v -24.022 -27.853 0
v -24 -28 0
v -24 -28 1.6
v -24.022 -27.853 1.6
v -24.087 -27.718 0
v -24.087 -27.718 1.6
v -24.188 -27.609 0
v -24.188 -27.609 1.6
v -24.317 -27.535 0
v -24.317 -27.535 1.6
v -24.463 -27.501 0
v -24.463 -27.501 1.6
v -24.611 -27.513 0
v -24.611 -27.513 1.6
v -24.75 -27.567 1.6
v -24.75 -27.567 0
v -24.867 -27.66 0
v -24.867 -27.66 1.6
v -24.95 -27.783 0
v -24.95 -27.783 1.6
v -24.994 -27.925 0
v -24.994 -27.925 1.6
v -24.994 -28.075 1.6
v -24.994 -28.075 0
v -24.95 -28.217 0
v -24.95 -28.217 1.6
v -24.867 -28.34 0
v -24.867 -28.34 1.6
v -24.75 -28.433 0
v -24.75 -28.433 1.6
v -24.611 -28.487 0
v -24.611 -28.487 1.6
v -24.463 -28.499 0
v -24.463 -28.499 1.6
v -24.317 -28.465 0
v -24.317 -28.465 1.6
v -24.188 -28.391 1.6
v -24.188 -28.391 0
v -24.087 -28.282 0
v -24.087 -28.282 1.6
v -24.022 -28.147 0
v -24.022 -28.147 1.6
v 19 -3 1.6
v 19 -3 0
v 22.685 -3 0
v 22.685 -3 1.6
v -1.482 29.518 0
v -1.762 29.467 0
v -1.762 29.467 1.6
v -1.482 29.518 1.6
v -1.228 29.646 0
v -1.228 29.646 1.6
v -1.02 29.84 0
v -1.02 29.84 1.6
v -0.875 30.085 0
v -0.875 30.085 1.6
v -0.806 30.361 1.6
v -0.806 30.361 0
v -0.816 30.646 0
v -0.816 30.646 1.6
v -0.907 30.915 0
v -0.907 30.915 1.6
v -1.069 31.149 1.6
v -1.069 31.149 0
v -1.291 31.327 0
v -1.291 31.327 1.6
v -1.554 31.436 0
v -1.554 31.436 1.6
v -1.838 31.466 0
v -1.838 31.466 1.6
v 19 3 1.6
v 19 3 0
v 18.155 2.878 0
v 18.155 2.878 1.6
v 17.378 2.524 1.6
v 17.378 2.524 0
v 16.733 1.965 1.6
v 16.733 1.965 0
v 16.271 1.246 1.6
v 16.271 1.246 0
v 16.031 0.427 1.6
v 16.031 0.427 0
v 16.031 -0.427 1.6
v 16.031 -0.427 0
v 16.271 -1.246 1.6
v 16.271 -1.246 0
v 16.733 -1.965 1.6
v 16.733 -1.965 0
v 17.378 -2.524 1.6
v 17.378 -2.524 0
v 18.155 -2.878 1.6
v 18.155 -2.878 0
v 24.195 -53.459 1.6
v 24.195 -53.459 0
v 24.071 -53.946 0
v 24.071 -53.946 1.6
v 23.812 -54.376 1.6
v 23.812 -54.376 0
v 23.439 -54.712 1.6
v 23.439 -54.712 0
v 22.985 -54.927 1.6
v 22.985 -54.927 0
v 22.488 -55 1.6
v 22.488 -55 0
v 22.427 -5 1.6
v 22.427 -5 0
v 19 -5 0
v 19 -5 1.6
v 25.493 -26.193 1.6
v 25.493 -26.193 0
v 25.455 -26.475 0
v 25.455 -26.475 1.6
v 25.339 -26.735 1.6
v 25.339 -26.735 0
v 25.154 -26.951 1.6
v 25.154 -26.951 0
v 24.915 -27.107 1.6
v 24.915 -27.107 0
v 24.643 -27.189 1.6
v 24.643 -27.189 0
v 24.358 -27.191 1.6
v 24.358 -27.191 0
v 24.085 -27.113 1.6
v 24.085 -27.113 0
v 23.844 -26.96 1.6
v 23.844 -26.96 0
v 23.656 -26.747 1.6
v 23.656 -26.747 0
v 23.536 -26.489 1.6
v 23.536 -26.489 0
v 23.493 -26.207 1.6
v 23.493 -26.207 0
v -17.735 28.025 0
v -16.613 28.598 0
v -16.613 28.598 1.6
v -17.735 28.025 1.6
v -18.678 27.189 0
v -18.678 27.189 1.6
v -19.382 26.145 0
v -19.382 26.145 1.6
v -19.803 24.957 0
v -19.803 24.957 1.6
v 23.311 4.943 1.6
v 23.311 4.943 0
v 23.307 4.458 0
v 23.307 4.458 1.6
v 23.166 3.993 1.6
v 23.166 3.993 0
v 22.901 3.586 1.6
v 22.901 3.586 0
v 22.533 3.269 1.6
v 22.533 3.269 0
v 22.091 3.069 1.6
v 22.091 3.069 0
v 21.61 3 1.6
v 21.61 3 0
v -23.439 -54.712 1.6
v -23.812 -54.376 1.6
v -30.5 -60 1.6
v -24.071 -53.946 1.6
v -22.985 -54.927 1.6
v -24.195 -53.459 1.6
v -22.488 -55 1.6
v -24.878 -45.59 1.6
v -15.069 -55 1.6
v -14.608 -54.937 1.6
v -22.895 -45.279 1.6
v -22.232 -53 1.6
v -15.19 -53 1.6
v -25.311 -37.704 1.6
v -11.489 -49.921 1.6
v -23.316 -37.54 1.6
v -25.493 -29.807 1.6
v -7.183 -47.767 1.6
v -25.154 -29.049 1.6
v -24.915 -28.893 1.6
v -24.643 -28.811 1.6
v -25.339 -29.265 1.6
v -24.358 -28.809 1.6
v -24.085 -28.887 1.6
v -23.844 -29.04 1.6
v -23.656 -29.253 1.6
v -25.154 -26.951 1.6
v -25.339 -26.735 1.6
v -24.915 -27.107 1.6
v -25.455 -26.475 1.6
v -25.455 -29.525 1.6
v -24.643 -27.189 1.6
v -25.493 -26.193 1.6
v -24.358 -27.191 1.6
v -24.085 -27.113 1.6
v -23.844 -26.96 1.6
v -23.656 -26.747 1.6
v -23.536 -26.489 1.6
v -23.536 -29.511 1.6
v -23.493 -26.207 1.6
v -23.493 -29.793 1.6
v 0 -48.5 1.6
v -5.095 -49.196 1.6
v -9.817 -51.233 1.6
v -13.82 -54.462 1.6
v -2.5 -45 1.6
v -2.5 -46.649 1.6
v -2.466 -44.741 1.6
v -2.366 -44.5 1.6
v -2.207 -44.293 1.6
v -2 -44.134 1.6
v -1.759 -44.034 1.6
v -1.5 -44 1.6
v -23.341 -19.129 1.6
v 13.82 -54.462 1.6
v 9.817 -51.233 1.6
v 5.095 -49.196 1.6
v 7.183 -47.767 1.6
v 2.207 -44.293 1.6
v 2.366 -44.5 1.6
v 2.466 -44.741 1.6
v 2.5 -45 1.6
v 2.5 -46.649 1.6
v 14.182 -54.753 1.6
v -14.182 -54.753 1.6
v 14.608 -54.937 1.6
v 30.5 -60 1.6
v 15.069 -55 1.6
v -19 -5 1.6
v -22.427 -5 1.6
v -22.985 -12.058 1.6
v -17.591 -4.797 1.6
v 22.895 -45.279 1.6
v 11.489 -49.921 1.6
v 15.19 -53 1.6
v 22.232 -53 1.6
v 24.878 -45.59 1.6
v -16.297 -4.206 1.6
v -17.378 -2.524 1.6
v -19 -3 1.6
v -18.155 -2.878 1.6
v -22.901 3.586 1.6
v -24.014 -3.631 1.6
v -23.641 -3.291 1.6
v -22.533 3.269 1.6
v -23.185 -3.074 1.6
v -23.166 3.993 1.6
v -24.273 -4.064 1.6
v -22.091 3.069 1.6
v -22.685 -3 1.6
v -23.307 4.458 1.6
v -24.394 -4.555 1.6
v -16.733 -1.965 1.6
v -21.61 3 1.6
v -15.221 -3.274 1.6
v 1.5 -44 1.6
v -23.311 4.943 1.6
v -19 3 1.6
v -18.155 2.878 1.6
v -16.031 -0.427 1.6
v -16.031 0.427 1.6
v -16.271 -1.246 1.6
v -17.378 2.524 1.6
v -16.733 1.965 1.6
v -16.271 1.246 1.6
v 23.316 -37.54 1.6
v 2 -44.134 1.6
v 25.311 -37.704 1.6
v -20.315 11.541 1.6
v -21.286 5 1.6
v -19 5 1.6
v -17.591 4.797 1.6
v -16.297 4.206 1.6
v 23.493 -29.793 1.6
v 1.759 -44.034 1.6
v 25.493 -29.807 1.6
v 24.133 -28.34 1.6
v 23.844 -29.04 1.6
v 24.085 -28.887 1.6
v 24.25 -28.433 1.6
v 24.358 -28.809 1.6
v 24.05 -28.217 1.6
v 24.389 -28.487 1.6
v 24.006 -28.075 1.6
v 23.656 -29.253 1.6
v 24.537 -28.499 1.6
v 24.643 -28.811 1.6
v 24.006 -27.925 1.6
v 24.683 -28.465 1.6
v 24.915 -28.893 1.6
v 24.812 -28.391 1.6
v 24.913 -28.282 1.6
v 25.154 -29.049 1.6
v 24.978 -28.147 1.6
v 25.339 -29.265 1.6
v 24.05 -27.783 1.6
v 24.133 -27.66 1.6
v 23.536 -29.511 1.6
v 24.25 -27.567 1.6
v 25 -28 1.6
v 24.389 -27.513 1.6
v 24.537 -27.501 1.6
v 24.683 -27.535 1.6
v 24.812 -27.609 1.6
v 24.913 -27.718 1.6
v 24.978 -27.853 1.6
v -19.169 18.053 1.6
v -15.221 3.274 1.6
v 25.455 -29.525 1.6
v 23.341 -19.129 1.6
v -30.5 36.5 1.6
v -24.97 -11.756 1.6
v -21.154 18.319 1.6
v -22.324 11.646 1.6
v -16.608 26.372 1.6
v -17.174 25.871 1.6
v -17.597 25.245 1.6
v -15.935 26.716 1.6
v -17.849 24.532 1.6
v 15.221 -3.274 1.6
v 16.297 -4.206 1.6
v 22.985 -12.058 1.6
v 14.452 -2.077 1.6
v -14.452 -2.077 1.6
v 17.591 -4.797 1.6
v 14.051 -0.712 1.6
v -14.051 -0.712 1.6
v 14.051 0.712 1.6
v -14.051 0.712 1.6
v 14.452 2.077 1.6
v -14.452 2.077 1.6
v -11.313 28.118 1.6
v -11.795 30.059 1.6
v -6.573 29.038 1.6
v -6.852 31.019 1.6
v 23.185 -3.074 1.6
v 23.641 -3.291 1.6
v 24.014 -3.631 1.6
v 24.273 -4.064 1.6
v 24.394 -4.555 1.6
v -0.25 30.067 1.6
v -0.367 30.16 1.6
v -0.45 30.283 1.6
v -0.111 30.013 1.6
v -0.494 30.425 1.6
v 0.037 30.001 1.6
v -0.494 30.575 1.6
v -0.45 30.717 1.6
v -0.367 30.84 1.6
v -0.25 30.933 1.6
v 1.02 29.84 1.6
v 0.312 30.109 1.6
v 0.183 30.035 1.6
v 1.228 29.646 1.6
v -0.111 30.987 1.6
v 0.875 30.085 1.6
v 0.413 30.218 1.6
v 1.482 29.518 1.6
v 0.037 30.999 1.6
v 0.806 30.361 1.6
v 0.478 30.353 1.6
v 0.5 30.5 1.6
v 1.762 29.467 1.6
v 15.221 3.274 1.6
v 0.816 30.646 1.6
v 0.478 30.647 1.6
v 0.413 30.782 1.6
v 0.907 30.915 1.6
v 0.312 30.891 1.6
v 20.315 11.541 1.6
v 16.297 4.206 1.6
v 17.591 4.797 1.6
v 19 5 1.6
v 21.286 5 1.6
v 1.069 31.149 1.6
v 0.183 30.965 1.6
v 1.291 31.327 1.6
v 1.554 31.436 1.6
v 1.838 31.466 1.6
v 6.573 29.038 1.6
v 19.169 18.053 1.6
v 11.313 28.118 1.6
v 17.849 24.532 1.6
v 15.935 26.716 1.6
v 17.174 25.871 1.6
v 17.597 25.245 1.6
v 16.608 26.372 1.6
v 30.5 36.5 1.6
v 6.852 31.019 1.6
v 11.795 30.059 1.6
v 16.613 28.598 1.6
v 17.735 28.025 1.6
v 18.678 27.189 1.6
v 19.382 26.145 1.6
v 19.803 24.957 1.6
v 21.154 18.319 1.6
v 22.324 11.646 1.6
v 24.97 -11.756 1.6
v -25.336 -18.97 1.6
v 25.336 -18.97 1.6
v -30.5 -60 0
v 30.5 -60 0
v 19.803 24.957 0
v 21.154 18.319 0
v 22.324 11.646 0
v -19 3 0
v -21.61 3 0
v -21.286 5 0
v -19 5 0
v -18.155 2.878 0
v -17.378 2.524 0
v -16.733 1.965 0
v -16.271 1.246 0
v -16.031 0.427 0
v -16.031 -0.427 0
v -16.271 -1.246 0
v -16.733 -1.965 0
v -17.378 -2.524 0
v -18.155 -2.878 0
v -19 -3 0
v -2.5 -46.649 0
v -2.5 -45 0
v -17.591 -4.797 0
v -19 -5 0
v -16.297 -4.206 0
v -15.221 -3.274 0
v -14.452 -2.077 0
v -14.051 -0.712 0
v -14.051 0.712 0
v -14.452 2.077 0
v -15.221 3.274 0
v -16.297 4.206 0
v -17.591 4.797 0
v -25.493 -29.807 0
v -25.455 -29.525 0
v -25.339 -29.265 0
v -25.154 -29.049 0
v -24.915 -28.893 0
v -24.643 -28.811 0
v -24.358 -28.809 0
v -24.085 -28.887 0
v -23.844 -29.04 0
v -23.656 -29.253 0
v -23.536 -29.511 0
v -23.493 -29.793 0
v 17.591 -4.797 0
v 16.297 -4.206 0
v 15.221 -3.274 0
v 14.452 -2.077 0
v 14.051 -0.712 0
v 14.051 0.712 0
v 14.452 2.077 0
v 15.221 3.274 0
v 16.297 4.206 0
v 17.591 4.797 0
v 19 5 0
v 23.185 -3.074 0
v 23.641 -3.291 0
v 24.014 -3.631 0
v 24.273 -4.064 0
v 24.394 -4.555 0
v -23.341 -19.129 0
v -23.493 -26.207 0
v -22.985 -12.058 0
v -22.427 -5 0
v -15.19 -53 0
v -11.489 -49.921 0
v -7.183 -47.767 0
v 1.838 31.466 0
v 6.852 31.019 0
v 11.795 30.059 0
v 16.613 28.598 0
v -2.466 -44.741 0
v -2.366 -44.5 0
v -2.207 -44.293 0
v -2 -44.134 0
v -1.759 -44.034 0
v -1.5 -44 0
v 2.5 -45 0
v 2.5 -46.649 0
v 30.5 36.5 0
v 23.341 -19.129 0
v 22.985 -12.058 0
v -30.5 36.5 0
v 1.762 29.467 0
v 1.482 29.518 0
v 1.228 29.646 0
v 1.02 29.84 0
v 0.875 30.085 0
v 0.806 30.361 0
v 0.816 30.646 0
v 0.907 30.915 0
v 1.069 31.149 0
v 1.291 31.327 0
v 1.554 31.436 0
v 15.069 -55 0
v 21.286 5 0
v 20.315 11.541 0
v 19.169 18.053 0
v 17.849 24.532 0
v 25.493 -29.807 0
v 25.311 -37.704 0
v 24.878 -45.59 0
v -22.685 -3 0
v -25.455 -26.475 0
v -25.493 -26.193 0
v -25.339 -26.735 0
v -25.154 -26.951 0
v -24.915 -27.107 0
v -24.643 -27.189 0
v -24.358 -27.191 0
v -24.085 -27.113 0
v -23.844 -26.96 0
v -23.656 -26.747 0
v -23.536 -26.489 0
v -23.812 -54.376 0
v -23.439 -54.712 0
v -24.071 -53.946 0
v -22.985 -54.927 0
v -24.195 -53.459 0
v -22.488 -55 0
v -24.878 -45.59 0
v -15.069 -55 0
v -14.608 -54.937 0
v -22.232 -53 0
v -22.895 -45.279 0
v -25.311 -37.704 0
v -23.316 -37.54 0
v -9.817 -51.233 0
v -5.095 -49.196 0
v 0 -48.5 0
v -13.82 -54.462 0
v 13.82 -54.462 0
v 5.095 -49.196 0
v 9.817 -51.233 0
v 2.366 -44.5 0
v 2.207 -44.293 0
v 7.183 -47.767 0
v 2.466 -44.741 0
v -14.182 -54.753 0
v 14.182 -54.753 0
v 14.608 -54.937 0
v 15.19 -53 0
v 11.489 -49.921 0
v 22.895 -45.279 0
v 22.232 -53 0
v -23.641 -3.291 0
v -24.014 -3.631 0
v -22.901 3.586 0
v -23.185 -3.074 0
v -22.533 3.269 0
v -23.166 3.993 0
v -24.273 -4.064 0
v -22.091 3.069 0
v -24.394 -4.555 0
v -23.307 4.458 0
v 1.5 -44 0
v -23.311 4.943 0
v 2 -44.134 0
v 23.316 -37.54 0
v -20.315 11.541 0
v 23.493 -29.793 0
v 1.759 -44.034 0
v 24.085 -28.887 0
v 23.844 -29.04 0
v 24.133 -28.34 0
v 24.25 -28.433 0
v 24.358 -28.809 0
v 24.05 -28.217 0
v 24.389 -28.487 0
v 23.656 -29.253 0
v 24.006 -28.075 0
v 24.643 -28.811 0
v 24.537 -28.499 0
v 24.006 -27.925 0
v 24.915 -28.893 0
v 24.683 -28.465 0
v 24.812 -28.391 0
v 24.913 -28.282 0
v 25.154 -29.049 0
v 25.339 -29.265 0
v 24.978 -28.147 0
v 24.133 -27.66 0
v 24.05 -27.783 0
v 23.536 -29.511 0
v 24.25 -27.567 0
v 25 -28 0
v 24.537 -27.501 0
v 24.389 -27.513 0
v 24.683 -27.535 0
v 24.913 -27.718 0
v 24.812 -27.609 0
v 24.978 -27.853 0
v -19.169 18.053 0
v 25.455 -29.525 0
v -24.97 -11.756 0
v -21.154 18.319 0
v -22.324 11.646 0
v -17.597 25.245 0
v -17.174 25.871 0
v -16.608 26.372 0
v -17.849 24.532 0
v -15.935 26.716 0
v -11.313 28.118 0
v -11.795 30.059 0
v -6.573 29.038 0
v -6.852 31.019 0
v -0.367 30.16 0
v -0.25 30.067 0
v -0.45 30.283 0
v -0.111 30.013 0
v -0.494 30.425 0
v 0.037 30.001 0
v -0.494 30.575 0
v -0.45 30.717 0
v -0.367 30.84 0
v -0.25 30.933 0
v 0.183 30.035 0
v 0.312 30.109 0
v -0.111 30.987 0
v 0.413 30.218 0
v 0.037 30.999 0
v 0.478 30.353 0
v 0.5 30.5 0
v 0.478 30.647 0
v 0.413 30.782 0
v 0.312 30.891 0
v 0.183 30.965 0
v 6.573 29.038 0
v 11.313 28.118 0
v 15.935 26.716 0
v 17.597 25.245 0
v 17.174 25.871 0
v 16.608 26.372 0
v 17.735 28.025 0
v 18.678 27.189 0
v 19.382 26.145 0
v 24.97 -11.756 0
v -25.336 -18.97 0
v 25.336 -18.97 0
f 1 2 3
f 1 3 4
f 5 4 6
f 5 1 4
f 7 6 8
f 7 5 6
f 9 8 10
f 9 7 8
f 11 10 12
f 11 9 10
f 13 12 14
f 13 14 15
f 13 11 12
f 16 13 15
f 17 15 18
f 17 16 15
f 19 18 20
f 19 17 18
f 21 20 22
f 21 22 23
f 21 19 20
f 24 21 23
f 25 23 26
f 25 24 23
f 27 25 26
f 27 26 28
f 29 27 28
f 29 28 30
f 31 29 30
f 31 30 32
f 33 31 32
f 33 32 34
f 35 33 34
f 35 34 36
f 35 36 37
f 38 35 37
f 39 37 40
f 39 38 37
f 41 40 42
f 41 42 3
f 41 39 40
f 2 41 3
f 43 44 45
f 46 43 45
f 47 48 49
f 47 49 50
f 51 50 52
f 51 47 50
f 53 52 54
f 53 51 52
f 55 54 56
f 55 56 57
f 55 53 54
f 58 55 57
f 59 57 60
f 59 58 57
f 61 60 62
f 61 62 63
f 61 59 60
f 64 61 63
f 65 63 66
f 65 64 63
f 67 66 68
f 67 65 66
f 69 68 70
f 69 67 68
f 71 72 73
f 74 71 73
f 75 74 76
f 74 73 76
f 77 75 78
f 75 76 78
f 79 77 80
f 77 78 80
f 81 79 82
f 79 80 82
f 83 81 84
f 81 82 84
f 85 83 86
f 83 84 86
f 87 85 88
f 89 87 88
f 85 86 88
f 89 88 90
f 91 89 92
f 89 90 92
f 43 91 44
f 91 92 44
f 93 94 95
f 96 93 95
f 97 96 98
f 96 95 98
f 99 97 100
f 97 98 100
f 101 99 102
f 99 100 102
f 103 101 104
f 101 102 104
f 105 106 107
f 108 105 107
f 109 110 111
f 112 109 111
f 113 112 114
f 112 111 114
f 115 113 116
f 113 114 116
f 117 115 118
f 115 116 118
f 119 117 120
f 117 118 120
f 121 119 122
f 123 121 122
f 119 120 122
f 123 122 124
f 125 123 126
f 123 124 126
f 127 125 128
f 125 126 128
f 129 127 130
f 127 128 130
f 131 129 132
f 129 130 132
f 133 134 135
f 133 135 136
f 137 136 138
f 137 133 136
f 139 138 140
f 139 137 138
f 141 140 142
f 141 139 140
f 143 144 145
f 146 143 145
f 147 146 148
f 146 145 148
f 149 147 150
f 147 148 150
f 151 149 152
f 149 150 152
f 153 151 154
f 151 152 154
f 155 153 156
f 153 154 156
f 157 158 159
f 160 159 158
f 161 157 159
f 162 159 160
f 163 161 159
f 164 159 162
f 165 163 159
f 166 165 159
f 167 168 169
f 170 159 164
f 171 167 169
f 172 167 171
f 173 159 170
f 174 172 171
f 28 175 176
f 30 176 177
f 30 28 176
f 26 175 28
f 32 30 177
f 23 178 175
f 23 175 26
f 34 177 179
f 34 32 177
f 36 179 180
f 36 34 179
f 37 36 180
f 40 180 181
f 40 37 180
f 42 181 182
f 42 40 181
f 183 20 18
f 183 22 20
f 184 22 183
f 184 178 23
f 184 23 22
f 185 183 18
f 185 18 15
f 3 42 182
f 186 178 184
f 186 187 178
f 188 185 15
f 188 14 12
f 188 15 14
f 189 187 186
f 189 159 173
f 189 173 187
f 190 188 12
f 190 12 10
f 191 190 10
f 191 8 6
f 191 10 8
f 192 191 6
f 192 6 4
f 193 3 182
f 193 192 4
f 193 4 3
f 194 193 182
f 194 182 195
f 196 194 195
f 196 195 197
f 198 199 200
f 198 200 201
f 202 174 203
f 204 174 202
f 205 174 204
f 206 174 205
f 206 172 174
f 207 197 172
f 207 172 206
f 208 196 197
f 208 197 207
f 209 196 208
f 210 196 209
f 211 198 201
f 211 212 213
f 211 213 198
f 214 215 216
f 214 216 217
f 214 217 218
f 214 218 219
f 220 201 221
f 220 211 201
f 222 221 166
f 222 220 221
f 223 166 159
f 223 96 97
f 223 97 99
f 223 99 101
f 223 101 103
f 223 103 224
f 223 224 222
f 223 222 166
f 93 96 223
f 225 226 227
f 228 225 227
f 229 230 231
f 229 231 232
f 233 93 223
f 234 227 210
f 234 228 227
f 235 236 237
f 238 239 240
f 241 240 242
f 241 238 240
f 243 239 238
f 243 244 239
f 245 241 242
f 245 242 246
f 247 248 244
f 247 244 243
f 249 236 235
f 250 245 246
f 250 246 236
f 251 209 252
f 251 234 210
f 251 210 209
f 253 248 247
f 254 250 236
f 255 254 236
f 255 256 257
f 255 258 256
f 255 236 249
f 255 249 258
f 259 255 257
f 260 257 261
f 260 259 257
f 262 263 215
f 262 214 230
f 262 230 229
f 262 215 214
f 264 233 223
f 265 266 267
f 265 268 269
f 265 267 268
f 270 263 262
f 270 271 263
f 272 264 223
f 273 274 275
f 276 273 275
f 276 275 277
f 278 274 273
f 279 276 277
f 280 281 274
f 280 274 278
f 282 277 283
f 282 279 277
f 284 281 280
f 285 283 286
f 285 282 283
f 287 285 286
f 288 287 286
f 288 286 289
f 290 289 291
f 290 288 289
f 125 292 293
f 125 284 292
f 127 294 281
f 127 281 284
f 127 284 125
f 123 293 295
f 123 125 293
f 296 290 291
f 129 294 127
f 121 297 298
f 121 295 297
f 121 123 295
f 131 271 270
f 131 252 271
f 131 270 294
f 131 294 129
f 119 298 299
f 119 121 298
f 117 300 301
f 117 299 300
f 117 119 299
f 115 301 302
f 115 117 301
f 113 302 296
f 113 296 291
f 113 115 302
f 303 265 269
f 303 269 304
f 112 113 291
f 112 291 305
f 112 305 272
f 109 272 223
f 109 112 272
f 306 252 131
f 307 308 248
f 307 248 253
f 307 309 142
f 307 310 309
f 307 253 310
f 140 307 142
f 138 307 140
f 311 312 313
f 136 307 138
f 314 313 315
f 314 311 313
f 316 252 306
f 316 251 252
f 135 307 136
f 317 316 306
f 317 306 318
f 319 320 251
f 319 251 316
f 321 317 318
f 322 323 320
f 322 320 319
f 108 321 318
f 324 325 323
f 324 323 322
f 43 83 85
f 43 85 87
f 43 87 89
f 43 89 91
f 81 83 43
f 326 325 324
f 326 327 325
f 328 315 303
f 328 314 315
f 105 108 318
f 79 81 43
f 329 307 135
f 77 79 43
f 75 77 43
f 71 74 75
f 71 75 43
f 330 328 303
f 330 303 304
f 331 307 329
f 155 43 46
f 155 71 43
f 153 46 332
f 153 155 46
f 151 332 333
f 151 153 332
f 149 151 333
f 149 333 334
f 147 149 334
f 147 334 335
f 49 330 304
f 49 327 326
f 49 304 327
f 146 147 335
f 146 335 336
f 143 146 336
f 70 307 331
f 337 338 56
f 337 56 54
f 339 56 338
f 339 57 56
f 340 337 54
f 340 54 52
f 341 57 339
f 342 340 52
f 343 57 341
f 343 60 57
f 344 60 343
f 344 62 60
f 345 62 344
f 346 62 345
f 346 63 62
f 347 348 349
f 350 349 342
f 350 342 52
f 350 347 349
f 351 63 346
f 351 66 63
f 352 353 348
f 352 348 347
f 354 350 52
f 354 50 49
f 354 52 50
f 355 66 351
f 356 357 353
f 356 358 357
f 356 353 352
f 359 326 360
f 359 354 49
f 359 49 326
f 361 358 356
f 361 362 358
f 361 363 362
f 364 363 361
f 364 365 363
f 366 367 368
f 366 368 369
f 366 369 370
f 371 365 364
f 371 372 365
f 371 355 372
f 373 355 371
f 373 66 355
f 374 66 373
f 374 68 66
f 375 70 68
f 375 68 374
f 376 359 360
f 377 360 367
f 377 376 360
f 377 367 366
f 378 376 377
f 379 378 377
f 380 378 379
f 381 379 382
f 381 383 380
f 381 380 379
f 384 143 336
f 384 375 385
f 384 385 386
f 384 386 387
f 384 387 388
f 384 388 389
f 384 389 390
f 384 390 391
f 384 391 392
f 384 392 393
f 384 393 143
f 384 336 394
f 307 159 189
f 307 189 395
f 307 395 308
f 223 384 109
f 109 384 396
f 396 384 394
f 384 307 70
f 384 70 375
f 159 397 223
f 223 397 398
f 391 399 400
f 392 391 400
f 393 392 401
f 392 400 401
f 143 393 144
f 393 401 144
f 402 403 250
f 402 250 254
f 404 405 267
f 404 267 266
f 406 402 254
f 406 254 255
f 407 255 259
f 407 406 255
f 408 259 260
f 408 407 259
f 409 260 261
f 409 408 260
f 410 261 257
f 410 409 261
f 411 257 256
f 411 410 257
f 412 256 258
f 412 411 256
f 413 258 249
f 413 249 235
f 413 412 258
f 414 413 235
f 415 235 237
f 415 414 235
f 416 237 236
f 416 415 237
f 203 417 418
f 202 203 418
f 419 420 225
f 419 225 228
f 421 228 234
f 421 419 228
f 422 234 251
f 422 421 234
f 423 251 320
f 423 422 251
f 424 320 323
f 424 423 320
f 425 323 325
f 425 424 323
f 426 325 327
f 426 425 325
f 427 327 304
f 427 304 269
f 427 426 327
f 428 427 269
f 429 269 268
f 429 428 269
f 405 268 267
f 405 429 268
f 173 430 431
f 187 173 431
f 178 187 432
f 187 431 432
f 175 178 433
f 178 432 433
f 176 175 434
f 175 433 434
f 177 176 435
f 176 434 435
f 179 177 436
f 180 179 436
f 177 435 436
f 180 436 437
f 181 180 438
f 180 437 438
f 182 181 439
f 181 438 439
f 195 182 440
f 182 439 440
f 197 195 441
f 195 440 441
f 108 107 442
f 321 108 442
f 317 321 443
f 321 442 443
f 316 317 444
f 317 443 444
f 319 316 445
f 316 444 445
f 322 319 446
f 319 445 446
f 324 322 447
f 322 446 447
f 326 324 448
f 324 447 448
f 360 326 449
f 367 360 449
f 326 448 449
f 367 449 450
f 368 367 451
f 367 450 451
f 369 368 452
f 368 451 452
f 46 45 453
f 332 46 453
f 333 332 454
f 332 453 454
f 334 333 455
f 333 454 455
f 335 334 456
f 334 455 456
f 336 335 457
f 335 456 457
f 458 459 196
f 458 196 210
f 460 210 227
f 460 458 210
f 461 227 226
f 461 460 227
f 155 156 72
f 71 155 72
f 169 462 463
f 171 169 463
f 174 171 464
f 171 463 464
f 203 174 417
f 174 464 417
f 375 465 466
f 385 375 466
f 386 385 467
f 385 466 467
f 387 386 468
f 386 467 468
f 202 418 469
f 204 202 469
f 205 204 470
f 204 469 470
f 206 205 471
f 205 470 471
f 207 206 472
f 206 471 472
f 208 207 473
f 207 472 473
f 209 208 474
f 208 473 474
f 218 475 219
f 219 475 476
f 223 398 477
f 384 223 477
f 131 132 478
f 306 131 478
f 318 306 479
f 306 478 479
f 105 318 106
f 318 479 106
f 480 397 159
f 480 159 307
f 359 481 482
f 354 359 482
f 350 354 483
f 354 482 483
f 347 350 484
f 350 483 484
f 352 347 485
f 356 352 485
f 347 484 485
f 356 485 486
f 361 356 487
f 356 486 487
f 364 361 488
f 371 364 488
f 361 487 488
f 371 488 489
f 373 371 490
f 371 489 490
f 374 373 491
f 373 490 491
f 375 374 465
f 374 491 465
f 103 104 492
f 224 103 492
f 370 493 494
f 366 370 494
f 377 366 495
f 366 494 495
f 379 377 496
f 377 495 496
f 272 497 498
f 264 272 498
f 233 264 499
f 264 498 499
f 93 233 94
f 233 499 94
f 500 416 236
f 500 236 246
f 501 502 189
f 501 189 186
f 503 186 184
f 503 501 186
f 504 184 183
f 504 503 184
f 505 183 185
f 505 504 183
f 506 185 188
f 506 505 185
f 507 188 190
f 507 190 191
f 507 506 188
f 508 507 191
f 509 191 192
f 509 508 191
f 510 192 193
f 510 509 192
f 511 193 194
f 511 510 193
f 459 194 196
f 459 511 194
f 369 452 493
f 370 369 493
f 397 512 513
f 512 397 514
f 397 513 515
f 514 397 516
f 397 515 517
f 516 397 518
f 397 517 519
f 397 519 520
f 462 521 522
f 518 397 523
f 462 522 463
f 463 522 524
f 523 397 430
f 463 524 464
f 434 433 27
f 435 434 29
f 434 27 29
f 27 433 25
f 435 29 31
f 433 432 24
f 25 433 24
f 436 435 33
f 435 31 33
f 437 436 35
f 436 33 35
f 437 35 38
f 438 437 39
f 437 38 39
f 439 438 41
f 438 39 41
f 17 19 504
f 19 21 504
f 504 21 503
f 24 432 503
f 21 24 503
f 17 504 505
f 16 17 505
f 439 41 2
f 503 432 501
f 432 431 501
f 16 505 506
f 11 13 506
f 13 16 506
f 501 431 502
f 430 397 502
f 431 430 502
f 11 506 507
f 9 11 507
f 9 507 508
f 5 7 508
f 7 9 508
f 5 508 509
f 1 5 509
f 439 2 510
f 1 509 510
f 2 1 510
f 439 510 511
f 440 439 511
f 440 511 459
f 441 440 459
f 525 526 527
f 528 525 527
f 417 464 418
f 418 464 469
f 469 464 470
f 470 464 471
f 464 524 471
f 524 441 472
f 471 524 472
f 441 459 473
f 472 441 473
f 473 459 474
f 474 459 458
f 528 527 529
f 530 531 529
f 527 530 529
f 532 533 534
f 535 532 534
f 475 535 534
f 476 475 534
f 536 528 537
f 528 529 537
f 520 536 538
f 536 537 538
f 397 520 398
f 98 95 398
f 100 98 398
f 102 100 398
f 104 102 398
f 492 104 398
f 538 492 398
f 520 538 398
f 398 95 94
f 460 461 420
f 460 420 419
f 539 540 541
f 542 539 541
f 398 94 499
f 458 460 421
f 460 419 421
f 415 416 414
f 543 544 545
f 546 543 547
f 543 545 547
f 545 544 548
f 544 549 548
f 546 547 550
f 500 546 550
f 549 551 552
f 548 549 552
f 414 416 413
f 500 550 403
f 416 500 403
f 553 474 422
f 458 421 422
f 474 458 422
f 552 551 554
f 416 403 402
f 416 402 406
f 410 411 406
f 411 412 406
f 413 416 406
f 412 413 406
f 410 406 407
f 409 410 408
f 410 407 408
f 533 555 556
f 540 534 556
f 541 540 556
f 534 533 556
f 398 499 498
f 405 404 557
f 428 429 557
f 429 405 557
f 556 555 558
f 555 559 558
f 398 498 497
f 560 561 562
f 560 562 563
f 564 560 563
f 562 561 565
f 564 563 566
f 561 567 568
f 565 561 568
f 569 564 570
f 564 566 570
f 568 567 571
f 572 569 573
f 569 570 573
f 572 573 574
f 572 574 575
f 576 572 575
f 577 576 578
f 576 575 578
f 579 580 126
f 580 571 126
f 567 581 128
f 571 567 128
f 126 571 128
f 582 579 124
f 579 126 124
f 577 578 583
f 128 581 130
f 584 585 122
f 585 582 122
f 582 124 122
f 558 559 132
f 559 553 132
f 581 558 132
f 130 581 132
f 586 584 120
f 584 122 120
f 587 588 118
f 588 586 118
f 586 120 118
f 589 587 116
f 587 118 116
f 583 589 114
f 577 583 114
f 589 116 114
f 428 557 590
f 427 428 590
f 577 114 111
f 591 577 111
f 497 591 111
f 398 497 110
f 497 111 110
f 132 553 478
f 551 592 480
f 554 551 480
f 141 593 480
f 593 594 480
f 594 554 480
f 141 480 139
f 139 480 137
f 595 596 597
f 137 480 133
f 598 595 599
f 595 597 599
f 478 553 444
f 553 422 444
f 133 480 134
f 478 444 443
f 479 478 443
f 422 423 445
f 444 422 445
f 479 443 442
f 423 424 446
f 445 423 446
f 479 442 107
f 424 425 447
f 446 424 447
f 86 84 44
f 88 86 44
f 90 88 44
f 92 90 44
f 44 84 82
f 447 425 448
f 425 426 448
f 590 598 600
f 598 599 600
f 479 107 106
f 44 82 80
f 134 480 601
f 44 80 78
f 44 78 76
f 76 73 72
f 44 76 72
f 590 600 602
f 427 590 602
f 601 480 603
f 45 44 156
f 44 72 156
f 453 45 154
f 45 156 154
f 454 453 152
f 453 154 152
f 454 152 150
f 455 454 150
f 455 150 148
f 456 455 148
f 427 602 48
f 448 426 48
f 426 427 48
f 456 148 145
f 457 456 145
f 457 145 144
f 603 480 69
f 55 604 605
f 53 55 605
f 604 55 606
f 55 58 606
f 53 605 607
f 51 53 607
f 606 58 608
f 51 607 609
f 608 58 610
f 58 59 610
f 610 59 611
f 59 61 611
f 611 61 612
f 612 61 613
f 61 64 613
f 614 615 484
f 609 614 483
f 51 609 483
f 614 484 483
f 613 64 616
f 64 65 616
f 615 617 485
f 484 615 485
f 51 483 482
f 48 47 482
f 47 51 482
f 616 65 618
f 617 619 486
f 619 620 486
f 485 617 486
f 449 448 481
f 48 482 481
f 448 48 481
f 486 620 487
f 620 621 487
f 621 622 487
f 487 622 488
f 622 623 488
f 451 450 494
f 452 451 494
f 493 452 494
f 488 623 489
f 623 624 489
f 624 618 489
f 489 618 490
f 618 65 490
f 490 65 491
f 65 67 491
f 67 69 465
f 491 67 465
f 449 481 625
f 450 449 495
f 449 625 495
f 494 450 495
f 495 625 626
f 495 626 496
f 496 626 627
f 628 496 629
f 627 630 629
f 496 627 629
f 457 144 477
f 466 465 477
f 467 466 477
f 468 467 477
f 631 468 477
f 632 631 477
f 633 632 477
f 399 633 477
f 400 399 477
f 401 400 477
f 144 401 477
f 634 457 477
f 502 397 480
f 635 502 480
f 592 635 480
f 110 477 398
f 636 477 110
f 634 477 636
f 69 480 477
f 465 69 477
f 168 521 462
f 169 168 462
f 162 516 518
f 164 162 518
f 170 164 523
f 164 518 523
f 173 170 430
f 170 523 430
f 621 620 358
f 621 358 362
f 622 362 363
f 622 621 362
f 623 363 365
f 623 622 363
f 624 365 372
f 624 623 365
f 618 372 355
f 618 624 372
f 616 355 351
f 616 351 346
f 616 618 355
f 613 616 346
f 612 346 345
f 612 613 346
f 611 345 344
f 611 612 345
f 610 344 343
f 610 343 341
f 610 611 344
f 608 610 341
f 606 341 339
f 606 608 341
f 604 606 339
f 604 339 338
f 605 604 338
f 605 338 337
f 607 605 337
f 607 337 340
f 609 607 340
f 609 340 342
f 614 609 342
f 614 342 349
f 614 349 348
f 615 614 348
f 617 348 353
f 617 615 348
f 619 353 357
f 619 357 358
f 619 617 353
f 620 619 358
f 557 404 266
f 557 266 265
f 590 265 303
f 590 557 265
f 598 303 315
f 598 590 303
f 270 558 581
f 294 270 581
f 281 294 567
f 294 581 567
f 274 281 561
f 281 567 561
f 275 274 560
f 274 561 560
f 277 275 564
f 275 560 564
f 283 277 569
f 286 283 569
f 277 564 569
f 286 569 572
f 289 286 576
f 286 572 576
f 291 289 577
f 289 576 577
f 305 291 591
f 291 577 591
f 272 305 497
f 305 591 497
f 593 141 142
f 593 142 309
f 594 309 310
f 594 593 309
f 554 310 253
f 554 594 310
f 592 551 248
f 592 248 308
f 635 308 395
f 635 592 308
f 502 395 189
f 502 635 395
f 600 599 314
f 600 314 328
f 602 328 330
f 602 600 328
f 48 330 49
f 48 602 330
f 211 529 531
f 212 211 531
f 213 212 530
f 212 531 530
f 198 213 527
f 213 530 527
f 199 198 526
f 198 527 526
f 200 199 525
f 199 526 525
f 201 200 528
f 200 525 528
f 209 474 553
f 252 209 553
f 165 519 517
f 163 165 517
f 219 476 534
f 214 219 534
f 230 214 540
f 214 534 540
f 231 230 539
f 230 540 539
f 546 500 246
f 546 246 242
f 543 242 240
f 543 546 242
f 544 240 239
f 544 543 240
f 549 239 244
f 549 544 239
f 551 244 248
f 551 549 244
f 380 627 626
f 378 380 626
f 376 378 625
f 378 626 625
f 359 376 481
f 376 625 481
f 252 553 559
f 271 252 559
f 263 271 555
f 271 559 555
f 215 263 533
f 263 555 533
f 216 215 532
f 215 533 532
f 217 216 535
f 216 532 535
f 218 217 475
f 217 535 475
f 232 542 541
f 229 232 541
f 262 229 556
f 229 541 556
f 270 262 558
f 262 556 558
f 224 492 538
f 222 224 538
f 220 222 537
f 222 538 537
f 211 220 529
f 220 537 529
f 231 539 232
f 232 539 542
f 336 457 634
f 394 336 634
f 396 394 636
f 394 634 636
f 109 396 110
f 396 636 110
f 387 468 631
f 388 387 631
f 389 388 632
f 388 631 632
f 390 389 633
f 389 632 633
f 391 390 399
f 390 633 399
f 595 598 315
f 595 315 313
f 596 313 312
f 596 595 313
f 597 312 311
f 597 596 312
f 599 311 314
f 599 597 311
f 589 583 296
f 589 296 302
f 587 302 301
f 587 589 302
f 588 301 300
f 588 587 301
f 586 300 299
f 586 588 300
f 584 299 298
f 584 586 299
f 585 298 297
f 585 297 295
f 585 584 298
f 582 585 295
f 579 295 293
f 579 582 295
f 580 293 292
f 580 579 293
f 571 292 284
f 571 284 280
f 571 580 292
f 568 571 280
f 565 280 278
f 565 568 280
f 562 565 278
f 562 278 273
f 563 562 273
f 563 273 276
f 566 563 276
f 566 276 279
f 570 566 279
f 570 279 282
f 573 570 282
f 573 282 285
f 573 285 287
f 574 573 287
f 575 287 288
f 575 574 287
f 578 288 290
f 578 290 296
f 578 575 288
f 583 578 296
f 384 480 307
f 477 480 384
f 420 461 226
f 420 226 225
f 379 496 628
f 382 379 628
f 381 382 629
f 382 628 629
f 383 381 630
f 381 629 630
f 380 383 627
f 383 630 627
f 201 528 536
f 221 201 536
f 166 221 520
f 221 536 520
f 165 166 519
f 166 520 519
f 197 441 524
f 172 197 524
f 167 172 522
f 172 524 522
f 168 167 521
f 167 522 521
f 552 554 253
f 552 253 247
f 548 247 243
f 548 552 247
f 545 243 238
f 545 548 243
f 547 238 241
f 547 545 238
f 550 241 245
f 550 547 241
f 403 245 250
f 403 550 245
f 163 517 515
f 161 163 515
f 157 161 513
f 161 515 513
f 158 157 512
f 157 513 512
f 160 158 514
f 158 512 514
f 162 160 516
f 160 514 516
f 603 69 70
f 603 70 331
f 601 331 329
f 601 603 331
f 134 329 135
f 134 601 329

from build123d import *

# Parameters (mm, degrees)
SKIZZE1_W                       = 61
SKIZZE1_H                       = 96.5
SKIZZE1_R                       = 0.5
AUFSATZ_LINEAR_AUSTRAGEN1_DEPTH = 1.6


with BuildPart() as part:
    # Skizze1 → Aufsatz-Linear austragen1 (new body)
    with BuildSketch(Plane.XY):
        with Locations((0, -11.75)):
            Rectangle(SKIZZE1_W, SKIZZE1_H)
        with Locations((0, 30.5)):
            Circle(SKIZZE1_R, mode=Mode.SUBTRACT)
        with Locations((-24.5, -28)):
            Circle(SKIZZE1_R, mode=Mode.SUBTRACT)
        with Locations((24.5, -28)):
            Circle(SKIZZE1_R, mode=Mode.SUBTRACT)
        with BuildLine():
            Line((-22.231560855, -53), (-15.190457531, -53))
            ThreePointArc((-15.190457531, -53), (-9.397914174, -48.720244698), (-2.5, -46.649340538))
            Line((-2.5, -46.649340538), (-2.5, -45))
            ThreePointArc((-2.5, -45), (-2.207106781, -44.292893219), (-1.5, -44))
            Line((-1.5, -44), (1.5, -44))
            ThreePointArc((1.5, -44), (2.207106781, -44.292893219), (2.5, -45))
            Line((2.5, -45), (2.5, -46.649340538))
            ThreePointArc((2.5, -46.649340538), (9.397914174, -48.720244698), (15.190457531, -53))
            Line((15.190457531, -53), (22.231560855, -53))
            ThreePointArc((22.231560855, -53), (23.135640421, -41.41122194), (23.493493996, -29.792741935))
            ThreePointArc((23.493493996, -29.792741935), (24.50072572, -28.80002634), (25.493441316, -29.807258065))
            ThreePointArc((25.493441316, -29.807258065), (25.125648184, -41.648701954), (24.195027533, -53.459248528))
            ThreePointArc((24.195027533, -53.459248528), (23.637637029, -54.557859223), (22.487793054, -55))
            Line((22.487793054, -55), (15.068542623, -55))
            ThreePointArc((15.068542623, -55), (14.388773301, -54.859637633), (13.820194306, -54.461509699))
            ThreePointArc((13.820194306, -54.461509699), (0, -48.5), (-13.820194306, -54.461509699))
            ThreePointArc((-13.820194306, -54.461509699), (-14.388773301, -54.859637633), (-15.068542623, -55))
            Line((-15.068542623, -55), (-22.487793054, -55))
            ThreePointArc((-22.487793054, -55), (-23.637637029, -54.557859223), (-24.195027533, -53.459248528))
            ThreePointArc((-24.195027533, -53.459248528), (-25.125648184, -41.648701954), (-25.493441316, -29.807258065))
            ThreePointArc((-25.493441316, -29.807258065), (-24.50072572, -28.80002634), (-23.493493996, -29.792741935))
            ThreePointArc((-23.493493996, -29.792741935), (-23.135640421, -41.41122194), (-22.231560855, -53))
        make_face(mode=Mode.SUBTRACT)
        with BuildLine():
            Line((-19, 5), (-21.285620493, 5))
            ThreePointArc((-21.285620493, 5), (-19.763470557, 14.80051276), (-17.849098235, 24.532016724))
            ThreePointArc((-17.849098235, 24.532016724), (-17.173923296, 25.871247857), (-15.934850806, 26.716292583))
            ThreePointArc((-15.934850806, 26.716292583), (-8.95491897, 28.639022814), (-1.7625, 29.466941499))
            ThreePointArc((-1.7625, 29.466941499), (-0.800703372, 30.503738126), (-1.8375, 31.465534754))
            ThreePointArc((-1.8375, 31.465534754), (-9.335979351, 30.602385487), (-16.612929564, 28.597836948))
            ThreePointArc((-16.612929564, 28.597836948), (-18.67805038, 27.189429071), (-19.803341946, 24.957377183))
            ThreePointArc((-19.803341946, 24.957377183), (-21.761478169, 14.986129467), (-23.311141633, 4.943290145))
            ThreePointArc((-23.311141633, 4.943290145), (-22.901341819, 3.585796991), (-21.609999326, 3))
            Line((-21.609999326, 3), (-19, 3))
            ThreePointArc((-19, 3), (-16, 0), (-19, -3))
            Line((-19, -3), (-22.685152712, -3))
            ThreePointArc((-22.685152712, -3), (-23.84016455, -3.446823778), (-24.39375693, -4.554632116))
            ThreePointArc((-24.39375693, -4.554632116), (-25.179058013, -15.361720617), (-25.493441316, -26.192741935))
            ThreePointArc((-25.493441316, -26.192741935), (-24.50072572, -27.19997366), (-23.493493996, -26.207258065))
            ThreePointArc((-23.493493996, -26.207258065), (-23.188154433, -15.592161252), (-22.426818383, -5))
            Line((-22.426818383, -5), (-19, -5))
            ThreePointArc((-19, -5), (-14, 0), (-19, 5))
        make_face(mode=Mode.SUBTRACT)
        with BuildLine():
            Line((19, 5), (21.285620493, 5))
            ThreePointArc((21.285620493, 5), (19.763470557, 14.80051276), (17.849098235, 24.532016724))
            ThreePointArc((17.849098235, 24.532016724), (17.173923296, 25.871247857), (15.934850806, 26.716292583))
            ThreePointArc((15.934850806, 26.716292583), (8.95491897, 28.639022814), (1.7625, 29.466941499))
            ThreePointArc((1.7625, 29.466941499), (0.800703372, 30.503738126), (1.8375, 31.465534754))
            ThreePointArc((1.8375, 31.465534754), (9.335979351, 30.602385487), (16.612929564, 28.597836948))
            ThreePointArc((16.612929564, 28.597836948), (18.67805038, 27.189429071), (19.803341946, 24.957377183))
            ThreePointArc((19.803341946, 24.957377183), (21.761478169, 14.986129467), (23.311141633, 4.943290145))
            ThreePointArc((23.311141633, 4.943290145), (22.901341819, 3.585796991), (21.609999326, 3))
            Line((21.609999326, 3), (19, 3))
            ThreePointArc((19, 3), (16, 0), (19, -3))
            Line((19, -3), (22.685152712, -3))
            ThreePointArc((22.685152712, -3), (23.84016455, -3.446823778), (24.39375693, -4.554632116))
            ThreePointArc((24.39375693, -4.554632116), (25.179058013, -15.361720617), (25.493441316, -26.192741935))
            ThreePointArc((25.493441316, -26.192741935), (24.50072572, -27.19997366), (23.493493996, -26.207258065))
            ThreePointArc((23.493493996, -26.207258065), (23.188154433, -15.592161252), (22.426818383, -5))
            Line((22.426818383, -5), (19, -5))
            ThreePointArc((19, -5), (14, 0), (19, 5))
        make_face(mode=Mode.SUBTRACT)
    extrude(amount=AUFSATZ_LINEAR_AUSTRAGEN1_DEPTH)


solid = part.part
